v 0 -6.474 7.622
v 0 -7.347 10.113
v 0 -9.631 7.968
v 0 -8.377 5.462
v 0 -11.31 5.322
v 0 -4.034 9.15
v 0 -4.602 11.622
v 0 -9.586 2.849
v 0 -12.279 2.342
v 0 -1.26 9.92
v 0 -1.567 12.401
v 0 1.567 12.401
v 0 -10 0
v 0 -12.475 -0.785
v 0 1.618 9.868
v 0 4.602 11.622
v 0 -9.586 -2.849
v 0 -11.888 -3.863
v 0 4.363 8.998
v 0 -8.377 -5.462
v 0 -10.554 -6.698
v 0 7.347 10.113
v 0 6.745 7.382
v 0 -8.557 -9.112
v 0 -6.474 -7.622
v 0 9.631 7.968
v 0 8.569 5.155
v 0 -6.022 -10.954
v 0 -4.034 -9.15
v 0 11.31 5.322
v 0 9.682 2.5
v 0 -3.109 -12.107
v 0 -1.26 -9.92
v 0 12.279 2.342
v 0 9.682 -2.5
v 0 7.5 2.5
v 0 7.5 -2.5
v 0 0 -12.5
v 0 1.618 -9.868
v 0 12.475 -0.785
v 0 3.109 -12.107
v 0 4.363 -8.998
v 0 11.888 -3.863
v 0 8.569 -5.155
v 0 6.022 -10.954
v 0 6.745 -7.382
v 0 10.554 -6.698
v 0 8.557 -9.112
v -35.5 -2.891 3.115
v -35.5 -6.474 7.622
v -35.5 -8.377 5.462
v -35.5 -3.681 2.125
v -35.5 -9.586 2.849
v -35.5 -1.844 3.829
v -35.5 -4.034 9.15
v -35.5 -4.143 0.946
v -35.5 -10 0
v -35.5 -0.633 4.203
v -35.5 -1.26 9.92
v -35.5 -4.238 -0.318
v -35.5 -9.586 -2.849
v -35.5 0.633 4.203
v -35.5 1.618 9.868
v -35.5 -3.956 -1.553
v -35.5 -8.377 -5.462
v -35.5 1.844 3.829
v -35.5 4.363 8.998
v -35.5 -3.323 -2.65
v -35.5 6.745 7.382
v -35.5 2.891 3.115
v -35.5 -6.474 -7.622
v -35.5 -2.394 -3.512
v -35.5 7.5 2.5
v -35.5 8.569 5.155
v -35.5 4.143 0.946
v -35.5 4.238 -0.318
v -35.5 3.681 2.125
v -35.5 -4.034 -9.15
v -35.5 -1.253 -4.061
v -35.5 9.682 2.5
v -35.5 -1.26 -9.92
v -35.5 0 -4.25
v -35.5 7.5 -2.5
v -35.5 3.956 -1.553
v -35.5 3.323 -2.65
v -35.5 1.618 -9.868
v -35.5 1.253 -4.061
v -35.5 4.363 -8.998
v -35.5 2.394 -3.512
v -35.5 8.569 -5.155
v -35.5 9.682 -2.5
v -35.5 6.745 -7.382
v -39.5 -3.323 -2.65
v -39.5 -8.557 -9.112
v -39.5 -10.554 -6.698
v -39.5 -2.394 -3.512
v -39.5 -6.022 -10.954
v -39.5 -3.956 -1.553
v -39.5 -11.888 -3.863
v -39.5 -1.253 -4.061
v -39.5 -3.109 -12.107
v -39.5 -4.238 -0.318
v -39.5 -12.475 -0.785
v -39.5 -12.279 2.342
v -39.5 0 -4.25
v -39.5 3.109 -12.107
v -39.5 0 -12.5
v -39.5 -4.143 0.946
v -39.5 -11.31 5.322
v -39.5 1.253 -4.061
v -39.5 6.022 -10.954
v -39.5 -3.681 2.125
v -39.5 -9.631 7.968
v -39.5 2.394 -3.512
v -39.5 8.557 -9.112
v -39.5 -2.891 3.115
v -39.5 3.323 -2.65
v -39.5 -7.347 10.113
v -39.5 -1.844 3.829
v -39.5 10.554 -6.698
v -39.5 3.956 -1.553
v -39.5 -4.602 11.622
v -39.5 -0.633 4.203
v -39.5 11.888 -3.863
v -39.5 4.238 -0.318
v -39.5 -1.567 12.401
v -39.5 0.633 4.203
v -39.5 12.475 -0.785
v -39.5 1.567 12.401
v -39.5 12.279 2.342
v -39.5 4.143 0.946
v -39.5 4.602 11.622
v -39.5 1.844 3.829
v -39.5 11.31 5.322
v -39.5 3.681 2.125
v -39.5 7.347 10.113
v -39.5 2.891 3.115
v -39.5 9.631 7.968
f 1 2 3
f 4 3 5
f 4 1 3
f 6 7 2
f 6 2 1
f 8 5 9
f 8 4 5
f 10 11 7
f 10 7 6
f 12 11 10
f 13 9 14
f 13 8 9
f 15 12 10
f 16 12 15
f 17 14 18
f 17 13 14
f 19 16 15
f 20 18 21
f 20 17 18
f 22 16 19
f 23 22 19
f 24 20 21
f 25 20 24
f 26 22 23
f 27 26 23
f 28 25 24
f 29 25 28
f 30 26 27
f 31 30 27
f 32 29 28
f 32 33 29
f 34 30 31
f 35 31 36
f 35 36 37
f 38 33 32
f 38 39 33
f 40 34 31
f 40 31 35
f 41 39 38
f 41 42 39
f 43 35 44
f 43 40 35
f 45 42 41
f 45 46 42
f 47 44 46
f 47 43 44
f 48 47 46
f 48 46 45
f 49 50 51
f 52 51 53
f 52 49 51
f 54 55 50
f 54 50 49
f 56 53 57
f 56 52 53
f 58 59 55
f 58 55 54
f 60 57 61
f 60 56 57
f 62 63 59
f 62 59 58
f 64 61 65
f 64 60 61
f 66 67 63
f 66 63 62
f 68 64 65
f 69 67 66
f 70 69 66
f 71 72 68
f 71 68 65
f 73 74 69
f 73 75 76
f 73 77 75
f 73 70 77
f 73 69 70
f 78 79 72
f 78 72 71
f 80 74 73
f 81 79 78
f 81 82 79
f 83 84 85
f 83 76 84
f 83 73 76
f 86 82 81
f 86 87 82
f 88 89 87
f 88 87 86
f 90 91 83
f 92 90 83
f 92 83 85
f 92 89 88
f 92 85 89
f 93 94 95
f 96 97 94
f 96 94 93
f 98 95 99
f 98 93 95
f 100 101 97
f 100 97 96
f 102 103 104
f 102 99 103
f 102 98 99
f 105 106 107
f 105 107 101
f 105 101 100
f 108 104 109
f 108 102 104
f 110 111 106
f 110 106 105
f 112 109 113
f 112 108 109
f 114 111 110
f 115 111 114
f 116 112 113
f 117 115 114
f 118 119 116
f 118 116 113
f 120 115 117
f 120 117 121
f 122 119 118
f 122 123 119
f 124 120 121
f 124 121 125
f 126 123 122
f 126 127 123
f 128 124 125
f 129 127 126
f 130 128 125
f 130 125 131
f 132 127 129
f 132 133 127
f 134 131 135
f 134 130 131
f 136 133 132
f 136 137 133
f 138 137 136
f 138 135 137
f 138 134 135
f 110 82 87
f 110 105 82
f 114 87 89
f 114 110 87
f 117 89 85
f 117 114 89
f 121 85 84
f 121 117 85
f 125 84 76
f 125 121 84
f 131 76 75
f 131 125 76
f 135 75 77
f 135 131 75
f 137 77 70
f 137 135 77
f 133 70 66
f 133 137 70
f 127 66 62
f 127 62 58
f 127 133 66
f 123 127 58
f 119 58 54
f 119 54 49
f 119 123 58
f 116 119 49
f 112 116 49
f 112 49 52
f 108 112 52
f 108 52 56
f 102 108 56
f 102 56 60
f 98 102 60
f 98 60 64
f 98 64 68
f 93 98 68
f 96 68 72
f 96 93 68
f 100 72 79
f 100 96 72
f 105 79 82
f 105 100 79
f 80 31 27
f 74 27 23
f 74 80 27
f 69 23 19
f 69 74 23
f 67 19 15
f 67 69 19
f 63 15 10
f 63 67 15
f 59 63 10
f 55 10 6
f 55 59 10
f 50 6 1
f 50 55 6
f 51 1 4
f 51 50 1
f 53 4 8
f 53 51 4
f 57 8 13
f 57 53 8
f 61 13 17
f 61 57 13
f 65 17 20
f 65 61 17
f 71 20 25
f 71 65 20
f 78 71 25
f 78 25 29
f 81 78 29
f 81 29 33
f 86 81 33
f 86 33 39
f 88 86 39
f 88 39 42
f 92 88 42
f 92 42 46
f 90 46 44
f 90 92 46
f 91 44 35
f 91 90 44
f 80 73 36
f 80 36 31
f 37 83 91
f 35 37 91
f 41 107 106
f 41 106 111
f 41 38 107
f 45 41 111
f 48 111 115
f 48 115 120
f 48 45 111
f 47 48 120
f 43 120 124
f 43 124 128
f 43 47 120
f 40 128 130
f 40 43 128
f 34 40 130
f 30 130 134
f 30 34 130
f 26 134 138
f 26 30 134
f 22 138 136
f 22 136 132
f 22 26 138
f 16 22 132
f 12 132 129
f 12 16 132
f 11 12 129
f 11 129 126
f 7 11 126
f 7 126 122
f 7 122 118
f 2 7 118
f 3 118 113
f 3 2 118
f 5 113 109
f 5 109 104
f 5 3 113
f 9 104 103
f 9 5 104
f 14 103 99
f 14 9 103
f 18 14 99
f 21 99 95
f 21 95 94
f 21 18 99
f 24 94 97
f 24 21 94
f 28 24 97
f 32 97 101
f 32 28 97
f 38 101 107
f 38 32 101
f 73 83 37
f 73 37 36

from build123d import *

# Parameters (mm, degrees)
SKETCH_2_W      = 5
SKETCH_2_H      = 2.5
EXTRUDE_1_DEPTH = 39.5


with BuildPart() as part:
    # Эскиз1 → Повернуть1 (revolve)
    with BuildSketch(Plane(origin=(0, 0, 0), x_dir=(1, 0, 0), z_dir=(0, 1, 0))):
        Polygon((0, 10), (-35.5, 10), (-35.5, 4.25), (-39.5, 4.25), (-39.5, 12.5), (0, 12.5), align=None)
    revolve(axis=Axis((-1000, 0, 0), (1, 0, 0)))

    # Эскиз2 → Бобышка-Вытянуть1 (add)
    with BuildSketch(Plane.ZY.offset(39.5)):
        with Locations((0, 8.75)):
            Rectangle(SKETCH_2_W, SKETCH_2_H)
    extrude(amount=-EXTRUDE_1_DEPTH)


solid = part.part
